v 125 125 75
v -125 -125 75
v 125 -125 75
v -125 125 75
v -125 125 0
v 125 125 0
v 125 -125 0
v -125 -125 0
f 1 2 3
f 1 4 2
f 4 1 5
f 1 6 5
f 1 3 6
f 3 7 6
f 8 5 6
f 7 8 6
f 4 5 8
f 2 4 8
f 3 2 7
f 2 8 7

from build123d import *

# Parameters (mm, degrees)
F0_W      = 250
F0_H      = 250
F1_DEPTH  = 5
F3_DEPTH  = 70
F1_FACE_W = 210
F1_FACE_H = 240
F4_DEPTH  = 30
F5_W      = 30
F5_H      = 30
F6_DEPTH  = 40


with BuildPart() as f1:
    # F0 (on Top) → F1 (new body)
    with BuildSketch(Plane.XY):
        Rectangle(F0_W, F0_H)
    extrude(amount=F1_DEPTH)

    # F2 (on face) → F3 (join)
    with BuildSketch(Plane.XY.offset(5)):
        Polygon((-105, -125), (-105, 115), (105, 115), (105, -125), (125, -125), (125, 125), (-125, 125), (-125, -125), align=None)
    extrude(amount=F3_DEPTH)

    # F1_face (on face) → F4 (join)
    with BuildSketch(Plane.XY.offset(5)):
        with Locations((0, -5)):
            Rectangle(F1_FACE_W, F1_FACE_H)
    extrude(amount=F4_DEPTH)

    # F5 (on face) → F6 (join)
    with BuildSketch(Plane.XY.offset(35)):
        with Locations((-90, 100)):
            Rectangle(F5_W, F5_H)
        with Locations((-60, 70)):
            Rectangle(F5_W, F5_H)
        with Locations((-60, 100)):
            Rectangle(F5_W, F5_H)
        with Locations((-90, 70)):
            Rectangle(F5_W, F5_H)
        with Locations((-90, 40)):
            Rectangle(F5_W, F5_H)
        with Locations((-90, 10)):
            Rectangle(F5_W, F5_H)
        with Locations((-90, -20)):
            Rectangle(F5_W, F5_H)
        with Locations((-90, -50)):
            Rectangle(F5_W, F5_H)
        with Locations((-90, -80)):
            Rectangle(F5_W, F5_H)
        with Locations((-90, -110)):
            Rectangle(F5_W, F5_H)
        with Locations((-60, -110)):
            Rectangle(F5_W, F5_H)
        with Locations((-60, -80)):
            Rectangle(F5_W, F5_H)
        with Locations((-60, -50)):
            Rectangle(F5_W, F5_H)
        with Locations((-60, -20)):
            Rectangle(F5_W, F5_H)
        with Locations((-60, 10)):
            Rectangle(F5_W, F5_H)
        with Locations((-60, 40)):
            Rectangle(F5_W, F5_H)
        with Locations((-30, 100)):
            Rectangle(F5_W, F5_H)
        with Locations((-30, 70)):
            Rectangle(F5_W, F5_H)
        with Locations((-30, 40)):
            Rectangle(F5_W, F5_H)
        with Locations((-30, 10)):
            Rectangle(F5_W, F5_H)
        with Locations((-30, -20)):
            Rectangle(F5_W, F5_H)
        with Locations((-30, -110)):
            Rectangle(F5_W, F5_H)
        with Locations((-30, -80)):
            Rectangle(F5_W, F5_H)
        with Locations((-30, -50)):
            Rectangle(F5_W, F5_H)
        with Locations((0, -110)):
            Rectangle(F5_W, F5_H)
        with Locations((0, -80)):
            Rectangle(F5_W, F5_H)
        with Locations((0, -50)):
            Rectangle(F5_W, F5_H)
        with Locations((0, -20)):
            Rectangle(F5_W, F5_H)
        with Locations((0, 10)):
            Rectangle(F5_W, F5_H)
        with Locations((0, 40)):
            Rectangle(F5_W, F5_H)
        with Locations((0, 70)):
            Rectangle(F5_W, F5_H)
        with Locations((0, 100)):
            Rectangle(F5_W, F5_H)
        with Locations((30, 100)):
            Rectangle(F5_W, F5_H)
        with Locations((30, 70)):
            Rectangle(F5_W, F5_H)
        with Locations((30, 40)):
            Rectangle(F5_W, F5_H)
        with Locations((30, 10)):
            Rectangle(F5_W, F5_H)
        with Locations((30, -20)):
            Rectangle(F5_W, F5_H)
        with Locations((30, -50)):
            Rectangle(F5_W, F5_H)
        with Locations((30, -80)):
            Rectangle(F5_W, F5_H)
        with Locations((30, -110)):
            Rectangle(F5_W, F5_H)
        with Locations((60, -110)):
            Rectangle(F5_W, F5_H)
        with Locations((60, -80)):
            Rectangle(F5_W, F5_H)
        with Locations((60, -50)):
            Rectangle(F5_W, F5_H)
        with Locations((60, -20)):
            Rectangle(F5_W, F5_H)
        with Locations((60, 10)):
            Rectangle(F5_W, F5_H)
        with Locations((60, 40)):
            Rectangle(F5_W, F5_H)
        with Locations((60, 70)):
            Rectangle(F5_W, F5_H)
        with Locations((60, 100)):
            Rectangle(F5_W, F5_H)
        with Locations((90, -110)):
            Rectangle(F5_W, F5_H)
        with Locations((90, -80)):
            Rectangle(F5_W, F5_H)
        with Locations((90, -50)):
            Rectangle(F5_W, F5_H)
        with Locations((90, 10)):
            Rectangle(F5_W, F5_H)
        with Locations((90, -20)):
            Rectangle(F5_W, F5_H)
        with Locations((90, 40)):
            Rectangle(F5_W, F5_H)
        with Locations((90, 70)):
            Rectangle(F5_W, F5_H)
        with Locations((90, 100)):
            Rectangle(F5_W, F5_H)
    extrude(amount=F6_DEPTH)


solid = f1.part
